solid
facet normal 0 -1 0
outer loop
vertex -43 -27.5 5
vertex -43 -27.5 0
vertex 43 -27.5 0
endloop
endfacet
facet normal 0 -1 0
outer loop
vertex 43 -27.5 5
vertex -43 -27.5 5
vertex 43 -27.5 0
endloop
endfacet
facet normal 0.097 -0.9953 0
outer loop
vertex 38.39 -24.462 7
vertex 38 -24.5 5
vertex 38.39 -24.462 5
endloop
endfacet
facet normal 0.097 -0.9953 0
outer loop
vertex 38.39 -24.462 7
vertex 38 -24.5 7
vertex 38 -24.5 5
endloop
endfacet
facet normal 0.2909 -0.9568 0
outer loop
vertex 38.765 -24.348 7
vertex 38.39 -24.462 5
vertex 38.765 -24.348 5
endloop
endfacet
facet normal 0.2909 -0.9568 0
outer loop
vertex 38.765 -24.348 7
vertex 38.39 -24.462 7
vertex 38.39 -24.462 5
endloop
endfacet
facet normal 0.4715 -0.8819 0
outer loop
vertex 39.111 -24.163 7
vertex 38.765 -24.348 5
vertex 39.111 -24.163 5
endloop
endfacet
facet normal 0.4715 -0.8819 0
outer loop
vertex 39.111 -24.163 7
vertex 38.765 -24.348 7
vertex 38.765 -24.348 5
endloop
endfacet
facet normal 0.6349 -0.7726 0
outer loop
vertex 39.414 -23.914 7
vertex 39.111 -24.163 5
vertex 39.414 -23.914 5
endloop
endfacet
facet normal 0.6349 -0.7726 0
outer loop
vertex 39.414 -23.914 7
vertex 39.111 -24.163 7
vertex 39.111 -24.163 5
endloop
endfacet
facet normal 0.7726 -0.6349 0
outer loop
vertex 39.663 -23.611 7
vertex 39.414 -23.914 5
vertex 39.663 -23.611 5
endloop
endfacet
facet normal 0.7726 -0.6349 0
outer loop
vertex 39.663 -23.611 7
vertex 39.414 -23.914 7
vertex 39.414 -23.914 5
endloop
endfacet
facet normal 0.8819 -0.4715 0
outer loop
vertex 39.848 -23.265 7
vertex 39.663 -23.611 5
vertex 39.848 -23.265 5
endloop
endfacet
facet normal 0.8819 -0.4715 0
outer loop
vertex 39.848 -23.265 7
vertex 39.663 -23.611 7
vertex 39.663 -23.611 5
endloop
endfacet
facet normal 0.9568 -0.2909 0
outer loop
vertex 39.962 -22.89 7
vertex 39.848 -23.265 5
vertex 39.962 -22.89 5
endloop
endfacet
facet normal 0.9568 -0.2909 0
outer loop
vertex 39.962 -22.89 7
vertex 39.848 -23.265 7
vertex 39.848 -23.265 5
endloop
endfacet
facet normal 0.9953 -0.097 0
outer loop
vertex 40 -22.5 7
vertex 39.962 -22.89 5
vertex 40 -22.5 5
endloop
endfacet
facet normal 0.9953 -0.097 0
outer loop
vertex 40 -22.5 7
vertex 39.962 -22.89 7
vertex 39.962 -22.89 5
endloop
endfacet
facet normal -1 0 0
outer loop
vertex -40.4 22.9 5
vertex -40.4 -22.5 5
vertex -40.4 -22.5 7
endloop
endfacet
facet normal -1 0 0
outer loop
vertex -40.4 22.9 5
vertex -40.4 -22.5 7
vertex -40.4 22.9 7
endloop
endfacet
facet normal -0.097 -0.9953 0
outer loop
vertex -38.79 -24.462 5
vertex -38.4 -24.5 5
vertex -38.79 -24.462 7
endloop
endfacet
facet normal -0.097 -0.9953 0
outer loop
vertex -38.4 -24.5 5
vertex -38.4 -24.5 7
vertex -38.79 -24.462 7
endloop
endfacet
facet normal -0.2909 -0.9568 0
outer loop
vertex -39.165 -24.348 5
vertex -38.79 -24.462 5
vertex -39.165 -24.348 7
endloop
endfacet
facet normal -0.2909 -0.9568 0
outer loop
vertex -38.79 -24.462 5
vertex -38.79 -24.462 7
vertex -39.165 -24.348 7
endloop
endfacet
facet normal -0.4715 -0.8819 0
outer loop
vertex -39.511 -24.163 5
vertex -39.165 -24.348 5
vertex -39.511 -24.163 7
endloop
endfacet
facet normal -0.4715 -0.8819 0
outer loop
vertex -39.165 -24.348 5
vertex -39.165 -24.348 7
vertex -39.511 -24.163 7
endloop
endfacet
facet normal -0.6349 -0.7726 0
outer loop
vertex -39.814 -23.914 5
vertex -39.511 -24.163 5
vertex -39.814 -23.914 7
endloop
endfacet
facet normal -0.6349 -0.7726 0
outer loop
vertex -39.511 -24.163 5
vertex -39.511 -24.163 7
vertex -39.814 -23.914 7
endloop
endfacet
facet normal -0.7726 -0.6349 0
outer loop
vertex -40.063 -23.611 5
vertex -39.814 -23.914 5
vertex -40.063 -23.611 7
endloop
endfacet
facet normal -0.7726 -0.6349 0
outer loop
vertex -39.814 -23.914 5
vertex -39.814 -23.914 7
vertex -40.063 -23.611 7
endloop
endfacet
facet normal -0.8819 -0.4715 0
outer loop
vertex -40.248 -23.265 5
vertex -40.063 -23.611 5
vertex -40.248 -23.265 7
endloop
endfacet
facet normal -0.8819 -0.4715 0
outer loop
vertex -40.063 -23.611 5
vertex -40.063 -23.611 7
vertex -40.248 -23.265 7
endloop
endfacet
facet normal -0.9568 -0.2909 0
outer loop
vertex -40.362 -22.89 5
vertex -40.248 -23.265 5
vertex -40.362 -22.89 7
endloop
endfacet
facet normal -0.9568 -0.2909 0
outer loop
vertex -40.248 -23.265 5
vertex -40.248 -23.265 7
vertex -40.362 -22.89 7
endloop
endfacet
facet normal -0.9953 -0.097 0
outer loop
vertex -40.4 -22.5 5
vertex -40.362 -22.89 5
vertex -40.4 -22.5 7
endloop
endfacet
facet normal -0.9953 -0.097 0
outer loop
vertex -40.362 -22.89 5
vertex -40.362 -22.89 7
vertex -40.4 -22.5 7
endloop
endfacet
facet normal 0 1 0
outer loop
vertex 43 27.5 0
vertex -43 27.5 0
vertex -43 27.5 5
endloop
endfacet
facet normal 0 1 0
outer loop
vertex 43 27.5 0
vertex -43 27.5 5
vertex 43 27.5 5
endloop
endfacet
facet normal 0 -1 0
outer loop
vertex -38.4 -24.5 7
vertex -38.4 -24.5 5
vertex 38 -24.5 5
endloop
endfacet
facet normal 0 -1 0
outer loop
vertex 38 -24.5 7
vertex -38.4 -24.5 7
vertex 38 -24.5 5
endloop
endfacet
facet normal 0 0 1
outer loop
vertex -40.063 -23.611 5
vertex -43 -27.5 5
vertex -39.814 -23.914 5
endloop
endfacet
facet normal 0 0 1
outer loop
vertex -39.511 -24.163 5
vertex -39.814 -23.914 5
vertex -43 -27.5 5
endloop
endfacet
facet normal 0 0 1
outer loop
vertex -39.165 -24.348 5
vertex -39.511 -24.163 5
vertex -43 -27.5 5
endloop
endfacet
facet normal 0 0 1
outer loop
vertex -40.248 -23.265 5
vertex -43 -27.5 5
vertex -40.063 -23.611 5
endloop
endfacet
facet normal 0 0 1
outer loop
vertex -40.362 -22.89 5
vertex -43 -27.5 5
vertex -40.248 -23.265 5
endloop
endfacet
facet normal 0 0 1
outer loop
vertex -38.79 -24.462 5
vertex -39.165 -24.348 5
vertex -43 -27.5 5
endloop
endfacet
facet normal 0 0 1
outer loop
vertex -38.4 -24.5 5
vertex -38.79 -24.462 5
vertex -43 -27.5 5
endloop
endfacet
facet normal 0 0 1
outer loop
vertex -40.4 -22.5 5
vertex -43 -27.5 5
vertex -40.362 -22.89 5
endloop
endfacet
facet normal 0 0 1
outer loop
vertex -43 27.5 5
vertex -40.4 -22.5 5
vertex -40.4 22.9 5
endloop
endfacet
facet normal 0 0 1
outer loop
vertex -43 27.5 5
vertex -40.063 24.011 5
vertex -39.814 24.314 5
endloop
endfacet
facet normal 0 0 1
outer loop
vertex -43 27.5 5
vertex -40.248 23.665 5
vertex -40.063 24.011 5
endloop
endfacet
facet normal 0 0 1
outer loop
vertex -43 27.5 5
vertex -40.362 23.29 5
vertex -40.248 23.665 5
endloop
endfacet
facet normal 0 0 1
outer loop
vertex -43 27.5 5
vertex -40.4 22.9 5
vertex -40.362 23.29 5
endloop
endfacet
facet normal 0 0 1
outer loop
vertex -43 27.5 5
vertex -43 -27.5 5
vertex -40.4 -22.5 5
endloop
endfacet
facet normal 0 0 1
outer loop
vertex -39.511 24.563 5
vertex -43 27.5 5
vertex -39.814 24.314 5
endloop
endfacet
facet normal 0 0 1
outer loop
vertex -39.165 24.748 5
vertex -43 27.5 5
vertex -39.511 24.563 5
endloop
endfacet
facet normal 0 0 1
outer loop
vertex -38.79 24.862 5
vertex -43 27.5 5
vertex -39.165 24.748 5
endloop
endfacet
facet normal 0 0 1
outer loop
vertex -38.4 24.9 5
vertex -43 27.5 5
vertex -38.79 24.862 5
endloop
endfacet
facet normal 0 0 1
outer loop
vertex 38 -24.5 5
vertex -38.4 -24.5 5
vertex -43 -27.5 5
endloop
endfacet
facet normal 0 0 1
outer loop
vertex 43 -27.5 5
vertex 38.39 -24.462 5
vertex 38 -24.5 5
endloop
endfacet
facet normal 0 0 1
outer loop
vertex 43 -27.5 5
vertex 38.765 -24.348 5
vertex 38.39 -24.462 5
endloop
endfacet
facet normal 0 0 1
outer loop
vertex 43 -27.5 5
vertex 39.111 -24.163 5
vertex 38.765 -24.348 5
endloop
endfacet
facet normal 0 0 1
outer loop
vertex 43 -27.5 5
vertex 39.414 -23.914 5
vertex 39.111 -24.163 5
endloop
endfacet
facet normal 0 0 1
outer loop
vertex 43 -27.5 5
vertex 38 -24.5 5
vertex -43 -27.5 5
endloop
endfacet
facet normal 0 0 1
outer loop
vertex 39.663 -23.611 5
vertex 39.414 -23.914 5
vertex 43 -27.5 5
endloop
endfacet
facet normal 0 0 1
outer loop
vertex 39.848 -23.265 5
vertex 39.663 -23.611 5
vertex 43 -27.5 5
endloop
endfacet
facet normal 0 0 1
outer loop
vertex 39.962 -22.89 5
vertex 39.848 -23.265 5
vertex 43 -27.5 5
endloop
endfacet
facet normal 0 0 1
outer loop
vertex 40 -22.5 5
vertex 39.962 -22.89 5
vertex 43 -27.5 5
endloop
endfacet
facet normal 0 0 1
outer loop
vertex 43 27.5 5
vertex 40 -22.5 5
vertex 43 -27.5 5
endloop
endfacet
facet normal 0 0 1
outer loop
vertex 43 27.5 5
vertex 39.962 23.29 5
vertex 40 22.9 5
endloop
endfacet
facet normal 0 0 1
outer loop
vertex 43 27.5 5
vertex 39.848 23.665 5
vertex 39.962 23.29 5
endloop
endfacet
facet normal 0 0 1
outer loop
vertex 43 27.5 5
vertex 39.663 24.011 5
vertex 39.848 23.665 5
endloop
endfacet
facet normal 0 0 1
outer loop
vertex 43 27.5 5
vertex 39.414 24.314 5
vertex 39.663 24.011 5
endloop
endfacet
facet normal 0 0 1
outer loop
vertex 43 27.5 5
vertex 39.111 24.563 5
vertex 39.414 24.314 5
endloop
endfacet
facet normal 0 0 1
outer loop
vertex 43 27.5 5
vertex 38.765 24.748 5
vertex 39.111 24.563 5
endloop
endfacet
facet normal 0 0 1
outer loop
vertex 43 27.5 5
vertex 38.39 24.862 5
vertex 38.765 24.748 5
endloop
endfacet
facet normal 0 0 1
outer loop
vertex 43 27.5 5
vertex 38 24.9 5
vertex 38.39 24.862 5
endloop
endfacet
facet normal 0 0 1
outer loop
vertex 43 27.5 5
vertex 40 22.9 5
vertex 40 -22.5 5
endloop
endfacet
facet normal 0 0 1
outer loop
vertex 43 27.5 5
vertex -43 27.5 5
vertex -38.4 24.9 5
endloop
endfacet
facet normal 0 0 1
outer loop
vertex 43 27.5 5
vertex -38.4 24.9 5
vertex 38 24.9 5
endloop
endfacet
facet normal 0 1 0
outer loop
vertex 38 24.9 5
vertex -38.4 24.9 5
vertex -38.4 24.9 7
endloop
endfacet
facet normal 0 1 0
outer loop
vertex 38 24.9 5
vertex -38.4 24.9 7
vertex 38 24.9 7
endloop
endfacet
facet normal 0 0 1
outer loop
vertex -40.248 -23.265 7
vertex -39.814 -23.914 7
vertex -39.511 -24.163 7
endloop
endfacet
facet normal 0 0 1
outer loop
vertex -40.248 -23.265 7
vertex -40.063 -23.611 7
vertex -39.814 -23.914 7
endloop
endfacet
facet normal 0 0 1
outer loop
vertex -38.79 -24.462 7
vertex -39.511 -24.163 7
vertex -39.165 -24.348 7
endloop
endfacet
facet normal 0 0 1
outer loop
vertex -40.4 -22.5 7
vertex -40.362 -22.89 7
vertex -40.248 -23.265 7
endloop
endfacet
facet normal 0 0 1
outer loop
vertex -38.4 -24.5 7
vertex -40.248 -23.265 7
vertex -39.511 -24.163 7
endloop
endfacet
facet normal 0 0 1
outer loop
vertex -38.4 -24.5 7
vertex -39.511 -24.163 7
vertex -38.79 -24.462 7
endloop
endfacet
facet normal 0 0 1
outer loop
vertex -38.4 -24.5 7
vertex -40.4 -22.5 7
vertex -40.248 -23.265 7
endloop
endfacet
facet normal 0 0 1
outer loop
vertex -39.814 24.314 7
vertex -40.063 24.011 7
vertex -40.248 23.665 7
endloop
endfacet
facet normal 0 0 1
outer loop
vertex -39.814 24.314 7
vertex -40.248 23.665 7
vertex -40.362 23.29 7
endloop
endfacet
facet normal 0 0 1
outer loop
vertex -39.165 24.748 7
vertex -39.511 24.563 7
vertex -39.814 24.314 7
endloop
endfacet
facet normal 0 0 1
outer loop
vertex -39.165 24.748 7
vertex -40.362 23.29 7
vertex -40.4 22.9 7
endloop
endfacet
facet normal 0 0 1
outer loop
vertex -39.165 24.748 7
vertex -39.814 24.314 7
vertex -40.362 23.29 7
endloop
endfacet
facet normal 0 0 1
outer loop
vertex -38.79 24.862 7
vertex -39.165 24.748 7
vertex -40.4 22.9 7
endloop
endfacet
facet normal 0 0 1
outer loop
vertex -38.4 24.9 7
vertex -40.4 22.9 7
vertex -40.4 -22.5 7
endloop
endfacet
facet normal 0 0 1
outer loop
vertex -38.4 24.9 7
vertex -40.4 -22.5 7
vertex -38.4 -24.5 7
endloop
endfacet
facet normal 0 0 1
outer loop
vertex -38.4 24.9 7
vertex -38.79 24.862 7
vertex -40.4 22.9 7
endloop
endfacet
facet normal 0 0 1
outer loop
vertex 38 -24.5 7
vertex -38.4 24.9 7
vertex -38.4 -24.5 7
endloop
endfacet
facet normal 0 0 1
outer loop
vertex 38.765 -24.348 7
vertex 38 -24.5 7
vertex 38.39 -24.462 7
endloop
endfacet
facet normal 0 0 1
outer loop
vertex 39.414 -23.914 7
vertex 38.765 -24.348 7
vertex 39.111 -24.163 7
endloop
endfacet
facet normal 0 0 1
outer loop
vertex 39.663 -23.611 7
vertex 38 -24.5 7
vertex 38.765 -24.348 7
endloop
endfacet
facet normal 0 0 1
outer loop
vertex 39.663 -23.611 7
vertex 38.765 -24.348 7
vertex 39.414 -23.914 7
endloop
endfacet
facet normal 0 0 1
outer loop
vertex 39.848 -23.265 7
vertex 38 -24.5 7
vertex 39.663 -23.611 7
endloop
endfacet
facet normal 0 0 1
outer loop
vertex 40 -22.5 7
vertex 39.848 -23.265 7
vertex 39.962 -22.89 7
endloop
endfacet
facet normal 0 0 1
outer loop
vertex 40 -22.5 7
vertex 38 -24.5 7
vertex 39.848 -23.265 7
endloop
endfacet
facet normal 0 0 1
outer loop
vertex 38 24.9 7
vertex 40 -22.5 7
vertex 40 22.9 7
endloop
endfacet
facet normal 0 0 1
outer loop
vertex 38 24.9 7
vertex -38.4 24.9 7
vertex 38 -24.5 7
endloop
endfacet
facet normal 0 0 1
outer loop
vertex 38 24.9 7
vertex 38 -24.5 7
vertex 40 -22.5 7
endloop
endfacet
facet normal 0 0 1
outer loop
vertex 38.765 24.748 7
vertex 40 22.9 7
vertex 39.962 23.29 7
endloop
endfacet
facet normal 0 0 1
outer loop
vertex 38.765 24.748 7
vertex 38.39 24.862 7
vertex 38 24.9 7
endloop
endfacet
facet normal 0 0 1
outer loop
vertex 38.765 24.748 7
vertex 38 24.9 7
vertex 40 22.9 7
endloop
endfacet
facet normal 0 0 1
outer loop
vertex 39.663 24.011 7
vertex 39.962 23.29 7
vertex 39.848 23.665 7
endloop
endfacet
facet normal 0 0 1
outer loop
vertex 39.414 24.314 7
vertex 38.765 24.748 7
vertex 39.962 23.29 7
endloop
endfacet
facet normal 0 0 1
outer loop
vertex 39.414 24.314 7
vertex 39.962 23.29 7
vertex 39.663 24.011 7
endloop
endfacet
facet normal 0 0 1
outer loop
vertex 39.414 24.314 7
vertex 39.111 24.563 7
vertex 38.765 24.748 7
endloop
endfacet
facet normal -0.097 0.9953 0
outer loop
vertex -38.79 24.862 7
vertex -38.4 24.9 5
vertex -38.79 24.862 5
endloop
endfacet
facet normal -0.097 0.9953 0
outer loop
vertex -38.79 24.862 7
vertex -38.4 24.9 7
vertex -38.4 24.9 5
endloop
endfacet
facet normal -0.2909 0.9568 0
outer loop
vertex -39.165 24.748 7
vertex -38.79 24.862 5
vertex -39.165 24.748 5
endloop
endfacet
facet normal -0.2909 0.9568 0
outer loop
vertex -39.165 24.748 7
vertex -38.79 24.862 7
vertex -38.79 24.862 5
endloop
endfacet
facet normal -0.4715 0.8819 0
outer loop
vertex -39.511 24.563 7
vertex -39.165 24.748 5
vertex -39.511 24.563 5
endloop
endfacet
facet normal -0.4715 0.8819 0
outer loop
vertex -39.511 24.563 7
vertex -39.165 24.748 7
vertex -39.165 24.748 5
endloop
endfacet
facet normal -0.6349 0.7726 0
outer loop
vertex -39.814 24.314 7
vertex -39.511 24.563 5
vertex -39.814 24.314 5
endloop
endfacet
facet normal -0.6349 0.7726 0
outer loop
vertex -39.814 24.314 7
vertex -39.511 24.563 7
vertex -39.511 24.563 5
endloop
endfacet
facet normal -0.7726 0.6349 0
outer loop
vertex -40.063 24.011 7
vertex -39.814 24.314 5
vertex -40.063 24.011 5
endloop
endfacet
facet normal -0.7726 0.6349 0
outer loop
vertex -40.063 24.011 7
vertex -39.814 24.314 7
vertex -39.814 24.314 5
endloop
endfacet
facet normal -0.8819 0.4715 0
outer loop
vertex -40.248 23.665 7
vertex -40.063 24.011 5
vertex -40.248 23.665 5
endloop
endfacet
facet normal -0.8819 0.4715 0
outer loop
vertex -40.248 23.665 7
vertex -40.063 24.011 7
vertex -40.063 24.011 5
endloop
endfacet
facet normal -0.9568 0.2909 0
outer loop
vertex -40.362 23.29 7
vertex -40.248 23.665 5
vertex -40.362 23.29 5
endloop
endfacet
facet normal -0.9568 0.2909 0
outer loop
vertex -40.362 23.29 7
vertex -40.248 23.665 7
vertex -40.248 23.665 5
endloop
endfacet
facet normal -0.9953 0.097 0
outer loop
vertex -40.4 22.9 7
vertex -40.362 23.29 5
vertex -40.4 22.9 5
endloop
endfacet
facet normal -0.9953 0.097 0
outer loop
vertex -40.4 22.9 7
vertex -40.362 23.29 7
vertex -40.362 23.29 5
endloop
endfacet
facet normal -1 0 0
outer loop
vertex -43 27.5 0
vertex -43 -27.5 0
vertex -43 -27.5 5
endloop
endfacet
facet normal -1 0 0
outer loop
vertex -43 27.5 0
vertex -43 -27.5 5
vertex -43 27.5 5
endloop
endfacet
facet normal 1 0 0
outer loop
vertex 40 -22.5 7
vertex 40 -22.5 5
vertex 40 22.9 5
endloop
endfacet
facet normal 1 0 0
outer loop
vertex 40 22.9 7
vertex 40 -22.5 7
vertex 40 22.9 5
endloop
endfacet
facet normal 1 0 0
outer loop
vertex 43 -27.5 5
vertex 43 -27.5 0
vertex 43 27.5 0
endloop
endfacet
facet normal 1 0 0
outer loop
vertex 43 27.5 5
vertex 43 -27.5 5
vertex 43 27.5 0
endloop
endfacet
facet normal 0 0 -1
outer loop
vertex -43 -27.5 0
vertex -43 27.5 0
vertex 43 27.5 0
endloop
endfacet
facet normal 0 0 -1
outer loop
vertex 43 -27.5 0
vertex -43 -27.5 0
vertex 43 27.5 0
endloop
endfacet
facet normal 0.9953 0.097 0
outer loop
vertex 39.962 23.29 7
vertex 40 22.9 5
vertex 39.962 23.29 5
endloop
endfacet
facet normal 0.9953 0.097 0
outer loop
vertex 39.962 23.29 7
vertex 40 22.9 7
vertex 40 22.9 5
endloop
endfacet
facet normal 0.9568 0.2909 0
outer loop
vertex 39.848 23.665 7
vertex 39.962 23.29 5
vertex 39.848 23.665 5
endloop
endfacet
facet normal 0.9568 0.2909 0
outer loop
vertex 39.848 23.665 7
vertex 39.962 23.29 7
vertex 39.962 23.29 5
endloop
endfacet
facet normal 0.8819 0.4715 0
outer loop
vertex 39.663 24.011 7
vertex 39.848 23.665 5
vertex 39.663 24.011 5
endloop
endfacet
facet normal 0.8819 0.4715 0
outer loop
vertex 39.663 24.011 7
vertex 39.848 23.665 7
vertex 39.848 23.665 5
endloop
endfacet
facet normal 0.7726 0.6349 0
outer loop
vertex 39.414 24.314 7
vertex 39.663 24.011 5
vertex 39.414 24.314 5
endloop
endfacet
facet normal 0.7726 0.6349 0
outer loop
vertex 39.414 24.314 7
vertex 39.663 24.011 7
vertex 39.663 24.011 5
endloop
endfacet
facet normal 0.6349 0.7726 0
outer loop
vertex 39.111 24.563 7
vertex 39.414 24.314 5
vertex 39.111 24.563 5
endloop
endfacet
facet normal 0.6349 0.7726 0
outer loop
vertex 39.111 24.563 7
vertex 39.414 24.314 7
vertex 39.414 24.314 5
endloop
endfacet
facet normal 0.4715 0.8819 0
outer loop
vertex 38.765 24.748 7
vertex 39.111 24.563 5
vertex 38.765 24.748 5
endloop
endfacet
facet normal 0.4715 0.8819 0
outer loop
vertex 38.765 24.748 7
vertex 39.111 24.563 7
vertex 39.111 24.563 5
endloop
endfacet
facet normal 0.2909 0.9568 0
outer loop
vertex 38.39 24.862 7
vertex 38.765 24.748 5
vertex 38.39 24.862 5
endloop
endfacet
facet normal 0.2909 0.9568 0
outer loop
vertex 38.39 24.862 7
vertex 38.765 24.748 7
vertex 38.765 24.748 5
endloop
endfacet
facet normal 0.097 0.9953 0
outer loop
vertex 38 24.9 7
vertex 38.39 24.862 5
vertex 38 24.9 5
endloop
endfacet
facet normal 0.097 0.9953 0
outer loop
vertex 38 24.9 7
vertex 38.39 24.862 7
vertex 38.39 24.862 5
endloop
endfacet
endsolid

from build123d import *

# Parameters (mm, degrees)
F0_W     = 86
F0_H     = 55
F1_DEPTH = 5
F2_W     = 80.4
F2_H     = 49.4
F3_DEPTH = 2
F4_R     = 2


with BuildPart() as f1:
    # F0 (on Top) → F1 (new body)
    with BuildSketch(Plane.XY):
        Rectangle(F0_W, F0_H)
    extrude(amount=F1_DEPTH)

    # F2 (on face) → F3 (join)
    with BuildSketch(Plane.XY.offset(5)):
        with Locations((-0.2, 0.2)):
            Rectangle(F2_W, F2_H)
    extrude(amount=F3_DEPTH)

    # F4
    f4_edges = [f1.edges().sort_by_distance(p)[0] for p in [
        (-40.4, -24.5, 6),
        (-40.4, 24.9, 6),
        (40, -24.5, 6),
        (40, 24.9, 6),
    ]]
    fillet(f4_edges, radius=F4_R)


solid = f1.part
